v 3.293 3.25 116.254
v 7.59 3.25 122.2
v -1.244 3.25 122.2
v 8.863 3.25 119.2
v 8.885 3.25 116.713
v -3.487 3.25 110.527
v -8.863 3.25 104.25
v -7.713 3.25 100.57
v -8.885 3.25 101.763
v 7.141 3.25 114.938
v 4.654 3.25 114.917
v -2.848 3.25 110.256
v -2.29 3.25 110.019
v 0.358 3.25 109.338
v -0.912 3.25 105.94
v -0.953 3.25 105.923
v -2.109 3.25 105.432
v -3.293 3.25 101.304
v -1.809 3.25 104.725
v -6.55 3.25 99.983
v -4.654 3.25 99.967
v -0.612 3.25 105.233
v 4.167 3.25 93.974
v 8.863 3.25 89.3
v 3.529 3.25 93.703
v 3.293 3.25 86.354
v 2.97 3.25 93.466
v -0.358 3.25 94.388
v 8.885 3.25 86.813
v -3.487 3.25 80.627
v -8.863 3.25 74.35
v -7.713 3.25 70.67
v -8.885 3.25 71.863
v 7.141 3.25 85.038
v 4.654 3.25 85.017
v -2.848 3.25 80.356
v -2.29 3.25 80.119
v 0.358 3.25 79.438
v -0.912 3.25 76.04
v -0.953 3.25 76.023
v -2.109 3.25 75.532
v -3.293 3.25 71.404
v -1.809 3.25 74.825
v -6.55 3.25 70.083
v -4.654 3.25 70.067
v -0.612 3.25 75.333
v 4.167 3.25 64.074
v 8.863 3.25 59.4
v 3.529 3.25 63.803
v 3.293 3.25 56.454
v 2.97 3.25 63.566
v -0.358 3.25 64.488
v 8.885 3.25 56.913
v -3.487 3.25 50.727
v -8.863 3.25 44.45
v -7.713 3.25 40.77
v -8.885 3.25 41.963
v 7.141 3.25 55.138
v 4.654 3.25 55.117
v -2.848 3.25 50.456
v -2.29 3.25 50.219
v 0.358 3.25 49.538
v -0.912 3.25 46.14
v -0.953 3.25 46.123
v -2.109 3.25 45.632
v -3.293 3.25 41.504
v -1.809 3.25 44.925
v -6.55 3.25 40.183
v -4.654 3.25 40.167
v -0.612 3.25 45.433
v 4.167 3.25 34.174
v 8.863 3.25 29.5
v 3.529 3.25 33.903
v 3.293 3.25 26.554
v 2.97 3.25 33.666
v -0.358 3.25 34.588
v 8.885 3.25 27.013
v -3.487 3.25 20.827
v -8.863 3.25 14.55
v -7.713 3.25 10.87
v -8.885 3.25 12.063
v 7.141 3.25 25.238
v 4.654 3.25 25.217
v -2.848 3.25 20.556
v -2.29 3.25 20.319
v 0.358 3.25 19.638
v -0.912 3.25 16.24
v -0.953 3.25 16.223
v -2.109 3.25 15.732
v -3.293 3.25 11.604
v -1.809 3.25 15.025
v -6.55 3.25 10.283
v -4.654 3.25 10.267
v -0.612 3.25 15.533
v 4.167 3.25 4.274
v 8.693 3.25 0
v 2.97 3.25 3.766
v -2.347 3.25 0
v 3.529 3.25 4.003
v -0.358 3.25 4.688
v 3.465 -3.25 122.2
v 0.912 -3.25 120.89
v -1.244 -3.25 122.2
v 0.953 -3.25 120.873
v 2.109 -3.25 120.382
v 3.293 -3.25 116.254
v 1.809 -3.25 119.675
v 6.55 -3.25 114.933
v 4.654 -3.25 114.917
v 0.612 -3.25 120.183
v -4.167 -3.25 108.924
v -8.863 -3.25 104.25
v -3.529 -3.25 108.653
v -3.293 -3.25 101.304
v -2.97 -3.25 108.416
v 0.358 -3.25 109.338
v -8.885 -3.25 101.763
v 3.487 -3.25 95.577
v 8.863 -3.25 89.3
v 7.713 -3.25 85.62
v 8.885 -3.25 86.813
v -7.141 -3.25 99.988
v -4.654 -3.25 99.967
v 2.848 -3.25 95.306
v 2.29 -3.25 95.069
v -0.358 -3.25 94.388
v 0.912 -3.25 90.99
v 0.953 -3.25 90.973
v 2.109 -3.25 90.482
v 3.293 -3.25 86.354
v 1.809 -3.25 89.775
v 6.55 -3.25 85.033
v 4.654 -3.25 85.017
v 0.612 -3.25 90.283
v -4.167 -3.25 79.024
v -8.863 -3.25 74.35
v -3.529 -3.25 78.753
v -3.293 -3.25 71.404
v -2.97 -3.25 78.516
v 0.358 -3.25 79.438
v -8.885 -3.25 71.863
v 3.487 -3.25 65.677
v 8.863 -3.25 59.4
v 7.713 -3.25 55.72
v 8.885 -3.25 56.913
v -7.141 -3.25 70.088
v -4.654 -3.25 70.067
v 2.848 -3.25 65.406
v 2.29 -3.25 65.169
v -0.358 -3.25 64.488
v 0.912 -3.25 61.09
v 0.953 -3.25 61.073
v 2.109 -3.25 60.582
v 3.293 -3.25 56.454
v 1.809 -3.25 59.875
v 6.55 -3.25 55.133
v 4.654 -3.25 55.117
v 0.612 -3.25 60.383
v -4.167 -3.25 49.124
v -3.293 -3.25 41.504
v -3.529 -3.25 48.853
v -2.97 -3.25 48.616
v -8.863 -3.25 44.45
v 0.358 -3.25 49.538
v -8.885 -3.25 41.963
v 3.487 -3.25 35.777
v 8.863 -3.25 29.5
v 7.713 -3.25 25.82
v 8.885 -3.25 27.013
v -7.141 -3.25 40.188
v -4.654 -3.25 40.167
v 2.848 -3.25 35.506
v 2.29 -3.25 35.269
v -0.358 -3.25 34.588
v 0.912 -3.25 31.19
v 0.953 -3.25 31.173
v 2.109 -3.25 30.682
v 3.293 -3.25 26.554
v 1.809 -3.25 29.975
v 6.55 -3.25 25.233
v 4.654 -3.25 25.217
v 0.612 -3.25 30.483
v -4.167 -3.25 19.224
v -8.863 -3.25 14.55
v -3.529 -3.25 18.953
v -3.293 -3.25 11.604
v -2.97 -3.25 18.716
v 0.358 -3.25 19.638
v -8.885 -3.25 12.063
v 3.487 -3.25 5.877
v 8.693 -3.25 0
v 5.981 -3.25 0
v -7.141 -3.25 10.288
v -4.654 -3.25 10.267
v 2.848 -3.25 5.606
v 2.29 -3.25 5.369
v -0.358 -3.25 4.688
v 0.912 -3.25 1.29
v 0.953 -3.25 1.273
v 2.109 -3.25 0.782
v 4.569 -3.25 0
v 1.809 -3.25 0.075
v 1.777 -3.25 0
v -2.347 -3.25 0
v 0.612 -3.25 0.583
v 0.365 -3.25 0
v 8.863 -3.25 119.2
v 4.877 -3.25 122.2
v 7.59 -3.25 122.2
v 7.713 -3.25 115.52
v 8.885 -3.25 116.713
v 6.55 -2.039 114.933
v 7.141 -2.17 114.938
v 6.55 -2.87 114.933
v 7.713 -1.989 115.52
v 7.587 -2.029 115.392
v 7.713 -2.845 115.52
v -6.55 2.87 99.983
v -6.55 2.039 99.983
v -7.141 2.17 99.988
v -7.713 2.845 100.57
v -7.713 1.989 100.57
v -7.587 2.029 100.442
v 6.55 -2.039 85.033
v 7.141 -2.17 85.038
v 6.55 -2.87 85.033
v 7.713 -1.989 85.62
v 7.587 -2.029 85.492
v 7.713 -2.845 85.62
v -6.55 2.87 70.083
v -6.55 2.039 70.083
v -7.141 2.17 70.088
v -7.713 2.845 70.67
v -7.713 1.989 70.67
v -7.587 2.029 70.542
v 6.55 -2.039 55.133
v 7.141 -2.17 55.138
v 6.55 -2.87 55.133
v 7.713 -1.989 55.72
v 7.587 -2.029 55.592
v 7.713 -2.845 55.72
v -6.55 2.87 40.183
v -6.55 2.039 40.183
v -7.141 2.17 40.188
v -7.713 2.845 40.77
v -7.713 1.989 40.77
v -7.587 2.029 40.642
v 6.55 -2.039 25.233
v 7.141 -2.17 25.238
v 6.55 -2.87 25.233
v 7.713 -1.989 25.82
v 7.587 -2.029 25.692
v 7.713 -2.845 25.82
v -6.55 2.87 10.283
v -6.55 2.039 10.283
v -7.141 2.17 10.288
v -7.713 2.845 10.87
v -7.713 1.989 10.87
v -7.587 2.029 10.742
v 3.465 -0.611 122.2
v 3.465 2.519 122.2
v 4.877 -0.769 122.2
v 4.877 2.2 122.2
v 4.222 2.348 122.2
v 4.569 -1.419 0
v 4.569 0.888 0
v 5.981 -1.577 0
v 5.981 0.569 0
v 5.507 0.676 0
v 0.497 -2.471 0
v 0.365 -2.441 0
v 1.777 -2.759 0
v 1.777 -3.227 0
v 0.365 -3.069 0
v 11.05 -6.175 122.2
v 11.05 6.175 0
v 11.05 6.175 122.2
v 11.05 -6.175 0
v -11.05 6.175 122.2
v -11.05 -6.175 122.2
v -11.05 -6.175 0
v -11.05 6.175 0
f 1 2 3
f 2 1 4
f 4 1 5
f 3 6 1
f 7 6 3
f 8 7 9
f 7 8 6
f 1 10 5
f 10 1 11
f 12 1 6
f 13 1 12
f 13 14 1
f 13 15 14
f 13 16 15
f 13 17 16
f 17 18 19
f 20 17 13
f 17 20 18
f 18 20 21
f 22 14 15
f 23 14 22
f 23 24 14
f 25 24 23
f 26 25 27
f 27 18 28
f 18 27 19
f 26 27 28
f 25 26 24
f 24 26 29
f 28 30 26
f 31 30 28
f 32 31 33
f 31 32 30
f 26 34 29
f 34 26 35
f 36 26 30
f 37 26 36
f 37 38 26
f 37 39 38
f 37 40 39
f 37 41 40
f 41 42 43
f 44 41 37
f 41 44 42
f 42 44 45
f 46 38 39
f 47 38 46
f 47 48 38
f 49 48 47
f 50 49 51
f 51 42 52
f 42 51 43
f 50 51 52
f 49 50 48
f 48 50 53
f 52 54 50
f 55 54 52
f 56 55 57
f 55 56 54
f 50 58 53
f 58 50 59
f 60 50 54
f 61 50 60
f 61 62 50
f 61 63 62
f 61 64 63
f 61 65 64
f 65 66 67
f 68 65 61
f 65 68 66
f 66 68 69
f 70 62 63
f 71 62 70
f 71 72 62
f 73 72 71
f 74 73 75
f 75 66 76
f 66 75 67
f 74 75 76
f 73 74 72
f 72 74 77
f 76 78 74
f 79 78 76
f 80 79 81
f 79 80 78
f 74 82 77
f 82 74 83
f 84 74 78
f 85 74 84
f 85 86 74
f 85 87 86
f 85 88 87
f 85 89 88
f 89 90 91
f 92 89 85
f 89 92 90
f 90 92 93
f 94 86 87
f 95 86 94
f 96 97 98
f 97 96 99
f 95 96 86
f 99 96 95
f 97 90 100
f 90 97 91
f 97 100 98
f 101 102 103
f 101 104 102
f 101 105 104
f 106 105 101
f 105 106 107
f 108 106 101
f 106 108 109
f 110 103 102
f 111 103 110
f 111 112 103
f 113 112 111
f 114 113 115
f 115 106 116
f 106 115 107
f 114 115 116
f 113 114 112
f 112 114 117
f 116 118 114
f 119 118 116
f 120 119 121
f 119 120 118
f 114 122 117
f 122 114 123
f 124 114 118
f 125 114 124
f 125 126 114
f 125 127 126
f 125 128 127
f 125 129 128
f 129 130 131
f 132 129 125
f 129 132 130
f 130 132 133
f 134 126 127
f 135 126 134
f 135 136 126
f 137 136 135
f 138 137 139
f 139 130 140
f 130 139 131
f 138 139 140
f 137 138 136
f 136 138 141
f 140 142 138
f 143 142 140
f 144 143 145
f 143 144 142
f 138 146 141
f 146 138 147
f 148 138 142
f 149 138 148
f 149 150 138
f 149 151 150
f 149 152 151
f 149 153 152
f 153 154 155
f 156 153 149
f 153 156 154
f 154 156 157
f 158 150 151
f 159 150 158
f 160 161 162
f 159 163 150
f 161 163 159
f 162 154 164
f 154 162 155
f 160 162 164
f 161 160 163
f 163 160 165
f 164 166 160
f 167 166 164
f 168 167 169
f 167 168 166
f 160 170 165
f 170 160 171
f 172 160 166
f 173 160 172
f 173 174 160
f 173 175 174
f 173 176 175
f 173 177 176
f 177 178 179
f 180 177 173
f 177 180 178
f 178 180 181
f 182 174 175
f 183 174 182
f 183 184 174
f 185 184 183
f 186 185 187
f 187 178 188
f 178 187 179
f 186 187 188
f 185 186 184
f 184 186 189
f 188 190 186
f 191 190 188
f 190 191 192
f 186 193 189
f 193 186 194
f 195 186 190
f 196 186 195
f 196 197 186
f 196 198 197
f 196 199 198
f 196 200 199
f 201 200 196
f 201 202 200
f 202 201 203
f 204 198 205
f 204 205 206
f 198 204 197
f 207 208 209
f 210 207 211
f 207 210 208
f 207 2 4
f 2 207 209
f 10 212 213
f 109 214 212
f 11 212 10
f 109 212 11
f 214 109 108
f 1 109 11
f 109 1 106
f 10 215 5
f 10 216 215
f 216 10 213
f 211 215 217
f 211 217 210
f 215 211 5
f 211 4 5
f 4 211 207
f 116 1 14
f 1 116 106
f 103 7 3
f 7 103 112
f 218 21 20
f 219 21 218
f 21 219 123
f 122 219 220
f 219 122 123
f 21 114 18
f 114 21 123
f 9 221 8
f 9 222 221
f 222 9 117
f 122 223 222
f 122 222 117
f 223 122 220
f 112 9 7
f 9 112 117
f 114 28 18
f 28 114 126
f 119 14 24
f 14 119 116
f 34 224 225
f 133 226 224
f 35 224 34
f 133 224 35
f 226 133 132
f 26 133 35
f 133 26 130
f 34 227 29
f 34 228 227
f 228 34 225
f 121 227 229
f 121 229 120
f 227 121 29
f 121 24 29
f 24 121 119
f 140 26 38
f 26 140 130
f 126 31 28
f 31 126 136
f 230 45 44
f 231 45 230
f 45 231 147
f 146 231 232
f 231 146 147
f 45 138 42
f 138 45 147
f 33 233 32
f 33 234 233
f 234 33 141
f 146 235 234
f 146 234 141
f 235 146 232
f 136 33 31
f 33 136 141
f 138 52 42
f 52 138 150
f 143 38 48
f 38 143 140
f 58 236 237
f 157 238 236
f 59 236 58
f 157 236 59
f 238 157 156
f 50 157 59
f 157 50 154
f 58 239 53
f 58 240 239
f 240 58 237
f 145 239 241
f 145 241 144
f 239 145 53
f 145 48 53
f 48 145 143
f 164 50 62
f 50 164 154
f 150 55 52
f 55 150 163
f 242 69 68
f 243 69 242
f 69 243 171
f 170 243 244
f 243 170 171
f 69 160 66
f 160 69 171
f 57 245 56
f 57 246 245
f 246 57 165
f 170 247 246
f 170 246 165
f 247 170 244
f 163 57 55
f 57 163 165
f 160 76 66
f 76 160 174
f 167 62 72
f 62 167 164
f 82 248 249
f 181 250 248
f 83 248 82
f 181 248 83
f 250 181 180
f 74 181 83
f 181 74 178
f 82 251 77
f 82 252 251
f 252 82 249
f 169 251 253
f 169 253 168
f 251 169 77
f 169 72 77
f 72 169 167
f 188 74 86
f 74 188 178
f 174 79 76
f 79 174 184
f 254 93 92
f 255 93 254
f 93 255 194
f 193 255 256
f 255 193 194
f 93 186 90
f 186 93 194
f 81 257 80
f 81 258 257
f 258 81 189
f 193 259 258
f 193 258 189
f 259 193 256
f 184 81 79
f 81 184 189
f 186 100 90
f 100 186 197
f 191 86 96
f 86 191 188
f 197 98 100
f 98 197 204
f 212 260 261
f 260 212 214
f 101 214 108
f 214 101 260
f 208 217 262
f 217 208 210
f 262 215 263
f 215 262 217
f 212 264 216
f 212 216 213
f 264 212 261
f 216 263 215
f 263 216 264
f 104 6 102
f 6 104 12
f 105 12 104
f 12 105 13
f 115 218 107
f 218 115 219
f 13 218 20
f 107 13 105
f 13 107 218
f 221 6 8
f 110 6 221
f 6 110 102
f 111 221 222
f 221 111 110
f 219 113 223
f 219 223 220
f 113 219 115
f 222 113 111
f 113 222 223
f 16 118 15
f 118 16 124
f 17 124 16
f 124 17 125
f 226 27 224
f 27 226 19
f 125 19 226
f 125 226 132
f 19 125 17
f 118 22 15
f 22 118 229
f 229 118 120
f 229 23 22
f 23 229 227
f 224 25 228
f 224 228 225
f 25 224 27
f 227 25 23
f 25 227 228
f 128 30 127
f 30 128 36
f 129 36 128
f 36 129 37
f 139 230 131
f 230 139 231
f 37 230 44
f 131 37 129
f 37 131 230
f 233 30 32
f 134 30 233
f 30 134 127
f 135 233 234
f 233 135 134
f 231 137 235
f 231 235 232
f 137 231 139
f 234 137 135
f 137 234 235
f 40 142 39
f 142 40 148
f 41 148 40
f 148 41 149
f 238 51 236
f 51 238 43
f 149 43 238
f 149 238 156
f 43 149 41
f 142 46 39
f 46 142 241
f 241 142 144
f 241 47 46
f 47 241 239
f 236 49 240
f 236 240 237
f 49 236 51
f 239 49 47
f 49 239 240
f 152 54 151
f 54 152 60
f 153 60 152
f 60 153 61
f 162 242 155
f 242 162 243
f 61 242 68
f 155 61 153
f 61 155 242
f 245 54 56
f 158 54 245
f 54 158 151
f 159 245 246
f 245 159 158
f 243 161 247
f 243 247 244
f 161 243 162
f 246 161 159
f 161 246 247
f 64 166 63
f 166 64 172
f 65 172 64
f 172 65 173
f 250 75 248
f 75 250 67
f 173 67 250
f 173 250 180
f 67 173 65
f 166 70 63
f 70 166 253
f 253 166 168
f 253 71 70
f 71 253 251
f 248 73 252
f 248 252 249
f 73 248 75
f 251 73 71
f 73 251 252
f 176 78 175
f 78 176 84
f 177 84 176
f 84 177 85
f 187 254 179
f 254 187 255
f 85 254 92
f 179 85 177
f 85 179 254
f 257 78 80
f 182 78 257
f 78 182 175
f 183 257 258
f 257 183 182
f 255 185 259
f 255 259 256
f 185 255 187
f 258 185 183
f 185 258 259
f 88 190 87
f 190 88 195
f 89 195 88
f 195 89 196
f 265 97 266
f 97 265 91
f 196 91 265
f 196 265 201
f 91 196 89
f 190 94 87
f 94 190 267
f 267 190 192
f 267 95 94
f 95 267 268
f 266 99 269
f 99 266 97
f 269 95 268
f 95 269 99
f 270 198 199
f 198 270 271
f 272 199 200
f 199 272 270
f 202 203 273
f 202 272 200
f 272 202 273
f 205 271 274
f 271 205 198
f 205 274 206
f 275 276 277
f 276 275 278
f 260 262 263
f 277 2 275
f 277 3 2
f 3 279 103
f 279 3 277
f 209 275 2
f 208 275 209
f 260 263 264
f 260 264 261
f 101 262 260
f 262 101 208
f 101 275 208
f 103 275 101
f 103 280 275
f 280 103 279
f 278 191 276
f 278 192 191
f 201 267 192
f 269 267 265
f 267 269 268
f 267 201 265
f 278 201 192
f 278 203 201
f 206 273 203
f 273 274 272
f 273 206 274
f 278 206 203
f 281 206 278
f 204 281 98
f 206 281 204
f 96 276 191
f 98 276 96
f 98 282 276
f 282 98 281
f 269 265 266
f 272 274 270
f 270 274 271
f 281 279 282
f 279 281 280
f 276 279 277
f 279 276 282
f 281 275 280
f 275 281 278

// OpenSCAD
union() {
scale(1.3) difference() {
translate([0,0,47]) cube([17,9.5,94],center=true); 
translate([0,0,122]) rotate([0,180,0]) difference() {
union() {
union() {
union() {
union() {
union() {
union() {
union() {
union() {
union() {
union() {
union() {
union() {
union() {
union() {
union() {
translate([0,0,0.0]) rotate([0,0,0]) translate([-1,0,0]) rotate([0,-23,0]) union() {
cube([5,5,18],center=true); 
translate([0,0,9]) rotate([90,0,0]) translate([0,0,-2.5]) cylinder(5,2.5,2.5); 
}
}
translate([0,0,11.5]) rotate([0,0,180]) translate([-1,0,0]) rotate([0,-23,0]) union() {
cube([5,5,18],center=true); 
translate([0,0,9]) rotate([90,0,0]) translate([0,0,-2.5]) cylinder(5,2.5,2.5); 
}
}
translate([0,0,23.0]) rotate([0,0,360]) translate([-1,0,0]) rotate([0,-23,0]) union() {
cube([5,5,18],center=true); 
translate([0,0,9]) rotate([90,0,0]) translate([0,0,-2.5]) cylinder(5,2.5,2.5); 
}
}
translate([0,0,34.5]) rotate([0,0,540]) translate([-1,0,0]) rotate([0,-23,0]) union() {
cube([5,5,18],center=true); 
translate([0,0,9]) rotate([90,0,0]) translate([0,0,-2.5]) cylinder(5,2.5,2.5); 
}
}
translate([0,0,46.0]) rotate([0,0,720]) translate([-1,0,0]) rotate([0,-23,0]) union() {
cube([5,5,18],center=true); 
translate([0,0,9]) rotate([90,0,0]) translate([0,0,-2.5]) cylinder(5,2.5,2.5); 
}
}
translate([0,0,57.5]) rotate([0,0,900]) translate([-1,0,0]) rotate([0,-23,0]) union() {
cube([5,5,18],center=true); 
translate([0,0,9]) rotate([90,0,0]) translate([0,0,-2.5]) cylinder(5,2.5,2.5); 
}
}
translate([0,0,69.0]) rotate([0,0,1080]) translate([-1,0,0]) rotate([0,-23,0]) union() {
cube([5,5,18],center=true); 
translate([0,0,9]) rotate([90,0,0]) translate([0,0,-2.5]) cylinder(5,2.5,2.5); 
}
}
translate([0,0,80.5]) rotate([0,0,1260]) translate([-1,0,0]) rotate([0,-23,0]) union() {
cube([5,5,18],center=true); 
translate([0,0,9]) rotate([90,0,0]) translate([0,0,-2.5]) cylinder(5,2.5,2.5); 
}
}
translate([0,0,92.0]) rotate([0,0,1440]) translate([-1,0,0]) rotate([0,-23,0]) union() {
cube([5,5,18],center=true); 
translate([0,0,9]) rotate([90,0,0]) translate([0,0,-2.5]) cylinder(5,2.5,2.5); 
}
}
translate([0,0,103.5]) rotate([0,0,1620]) translate([-1,0,0]) rotate([0,-23,0]) union() {
cube([5,5,18],center=true); 
translate([0,0,9]) rotate([90,0,0]) translate([0,0,-2.5]) cylinder(5,2.5,2.5); 
}
}
translate([0,0,115.0]) rotate([0,0,1800]) translate([-1,0,0]) rotate([0,-23,0]) union() {
cube([5,5,18],center=true); 
translate([0,0,9]) rotate([90,0,0]) translate([0,0,-2.5]) cylinder(5,2.5,2.5); 
}
}
translate([0,0,126.5]) rotate([0,0,1980]) translate([-1,0,0]) rotate([0,-23,0]) union() {
cube([5,5,18],center=true); 
translate([0,0,9]) rotate([90,0,0]) translate([0,0,-2.5]) cylinder(5,2.5,2.5); 
}
}
translate([0,0,138.0]) rotate([0,0,2160]) translate([-1,0,0]) rotate([0,-23,0]) union() {
cube([5,5,18],center=true); 
translate([0,0,9]) rotate([90,0,0]) translate([0,0,-2.5]) cylinder(5,2.5,2.5); 
}
}
translate([0,0,149.5]) rotate([0,0,2340]) translate([-1,0,0]) rotate([0,-23,0]) union() {
cube([5,5,18],center=true); 
translate([0,0,9]) rotate([90,0,0]) translate([0,0,-2.5]) cylinder(5,2.5,2.5); 
}
}
translate([0,0,161.0]) rotate([0,0,2520]) translate([-1,0,0]) rotate([0,-23,0]) union() {
cube([5,5,18],center=true); 
translate([0,0,9]) rotate([90,0,0]) translate([0,0,-2.5]) cylinder(5,2.5,2.5); 
}
}
union() {
union() {
union() {
union() {
union() {
union() {
union() {
union() {
union() {
union() {
union() {
union() {
union() {
union() {
union() {
translate([0,0,0.0]) rotate([0,0,0]) rotate([0,-23,0]) translate([-1,0,4]) rotate([30,0,0]) cube([1,5,20],center=true); 
}
translate([0,0,11.5]) rotate([0,0,180]) rotate([0,-23,0]) translate([-1,0,4]) rotate([30,0,0]) cube([1,5,20],center=true); 
}
translate([0,0,23.0]) rotate([0,0,360]) rotate([0,-23,0]) translate([-1,0,4]) rotate([30,0,0]) cube([1,5,20],center=true); 
}
translate([0,0,34.5]) rotate([0,0,540]) rotate([0,-23,0]) translate([-1,0,4]) rotate([30,0,0]) cube([1,5,20],center=true); 
}
translate([0,0,46.0]) rotate([0,0,720]) rotate([0,-23,0]) translate([-1,0,4]) rotate([30,0,0]) cube([1,5,20],center=true); 
}
translate([0,0,57.5]) rotate([0,0,900]) rotate([0,-23,0]) translate([-1,0,4]) rotate([30,0,0]) cube([1,5,20],center=true); 
}
translate([0,0,69.0]) rotate([0,0,1080]) rotate([0,-23,0]) translate([-1,0,4]) rotate([30,0,0]) cube([1,5,20],center=true); 
}
translate([0,0,80.5]) rotate([0,0,1260]) rotate([0,-23,0]) translate([-1,0,4]) rotate([30,0,0]) cube([1,5,20],center=true); 
}
translate([0,0,92.0]) rotate([0,0,1440]) rotate([0,-23,0]) translate([-1,0,4]) rotate([30,0,0]) cube([1,5,20],center=true); 
}
translate([0,0,103.5]) rotate([0,0,1620]) rotate([0,-23,0]) translate([-1,0,4]) rotate([30,0,0]) cube([1,5,20],center=true); 
}
translate([0,0,115.0]) rotate([0,0,1800]) rotate([0,-23,0]) translate([-1,0,4]) rotate([30,0,0]) cube([1,5,20],center=true); 
}
translate([0,0,126.5]) rotate([0,0,1980]) rotate([0,-23,0]) translate([-1,0,4]) rotate([30,0,0]) cube([1,5,20],center=true); 
}
translate([0,0,138.0]) rotate([0,0,2160]) rotate([0,-23,0]) translate([-1,0,4]) rotate([30,0,0]) cube([1,5,20],center=true); 
}
translate([0,0,149.5]) rotate([0,0,2340]) rotate([0,-23,0]) translate([-1,0,4]) rotate([30,0,0]) cube([1,5,20],center=true); 
}
translate([0,0,161.0]) rotate([0,0,2520]) rotate([0,-23,0]) translate([-1,0,4]) rotate([30,0,0]) cube([1,5,20],center=true); 
}
}
}
%cube([20,30,40]); 
}
